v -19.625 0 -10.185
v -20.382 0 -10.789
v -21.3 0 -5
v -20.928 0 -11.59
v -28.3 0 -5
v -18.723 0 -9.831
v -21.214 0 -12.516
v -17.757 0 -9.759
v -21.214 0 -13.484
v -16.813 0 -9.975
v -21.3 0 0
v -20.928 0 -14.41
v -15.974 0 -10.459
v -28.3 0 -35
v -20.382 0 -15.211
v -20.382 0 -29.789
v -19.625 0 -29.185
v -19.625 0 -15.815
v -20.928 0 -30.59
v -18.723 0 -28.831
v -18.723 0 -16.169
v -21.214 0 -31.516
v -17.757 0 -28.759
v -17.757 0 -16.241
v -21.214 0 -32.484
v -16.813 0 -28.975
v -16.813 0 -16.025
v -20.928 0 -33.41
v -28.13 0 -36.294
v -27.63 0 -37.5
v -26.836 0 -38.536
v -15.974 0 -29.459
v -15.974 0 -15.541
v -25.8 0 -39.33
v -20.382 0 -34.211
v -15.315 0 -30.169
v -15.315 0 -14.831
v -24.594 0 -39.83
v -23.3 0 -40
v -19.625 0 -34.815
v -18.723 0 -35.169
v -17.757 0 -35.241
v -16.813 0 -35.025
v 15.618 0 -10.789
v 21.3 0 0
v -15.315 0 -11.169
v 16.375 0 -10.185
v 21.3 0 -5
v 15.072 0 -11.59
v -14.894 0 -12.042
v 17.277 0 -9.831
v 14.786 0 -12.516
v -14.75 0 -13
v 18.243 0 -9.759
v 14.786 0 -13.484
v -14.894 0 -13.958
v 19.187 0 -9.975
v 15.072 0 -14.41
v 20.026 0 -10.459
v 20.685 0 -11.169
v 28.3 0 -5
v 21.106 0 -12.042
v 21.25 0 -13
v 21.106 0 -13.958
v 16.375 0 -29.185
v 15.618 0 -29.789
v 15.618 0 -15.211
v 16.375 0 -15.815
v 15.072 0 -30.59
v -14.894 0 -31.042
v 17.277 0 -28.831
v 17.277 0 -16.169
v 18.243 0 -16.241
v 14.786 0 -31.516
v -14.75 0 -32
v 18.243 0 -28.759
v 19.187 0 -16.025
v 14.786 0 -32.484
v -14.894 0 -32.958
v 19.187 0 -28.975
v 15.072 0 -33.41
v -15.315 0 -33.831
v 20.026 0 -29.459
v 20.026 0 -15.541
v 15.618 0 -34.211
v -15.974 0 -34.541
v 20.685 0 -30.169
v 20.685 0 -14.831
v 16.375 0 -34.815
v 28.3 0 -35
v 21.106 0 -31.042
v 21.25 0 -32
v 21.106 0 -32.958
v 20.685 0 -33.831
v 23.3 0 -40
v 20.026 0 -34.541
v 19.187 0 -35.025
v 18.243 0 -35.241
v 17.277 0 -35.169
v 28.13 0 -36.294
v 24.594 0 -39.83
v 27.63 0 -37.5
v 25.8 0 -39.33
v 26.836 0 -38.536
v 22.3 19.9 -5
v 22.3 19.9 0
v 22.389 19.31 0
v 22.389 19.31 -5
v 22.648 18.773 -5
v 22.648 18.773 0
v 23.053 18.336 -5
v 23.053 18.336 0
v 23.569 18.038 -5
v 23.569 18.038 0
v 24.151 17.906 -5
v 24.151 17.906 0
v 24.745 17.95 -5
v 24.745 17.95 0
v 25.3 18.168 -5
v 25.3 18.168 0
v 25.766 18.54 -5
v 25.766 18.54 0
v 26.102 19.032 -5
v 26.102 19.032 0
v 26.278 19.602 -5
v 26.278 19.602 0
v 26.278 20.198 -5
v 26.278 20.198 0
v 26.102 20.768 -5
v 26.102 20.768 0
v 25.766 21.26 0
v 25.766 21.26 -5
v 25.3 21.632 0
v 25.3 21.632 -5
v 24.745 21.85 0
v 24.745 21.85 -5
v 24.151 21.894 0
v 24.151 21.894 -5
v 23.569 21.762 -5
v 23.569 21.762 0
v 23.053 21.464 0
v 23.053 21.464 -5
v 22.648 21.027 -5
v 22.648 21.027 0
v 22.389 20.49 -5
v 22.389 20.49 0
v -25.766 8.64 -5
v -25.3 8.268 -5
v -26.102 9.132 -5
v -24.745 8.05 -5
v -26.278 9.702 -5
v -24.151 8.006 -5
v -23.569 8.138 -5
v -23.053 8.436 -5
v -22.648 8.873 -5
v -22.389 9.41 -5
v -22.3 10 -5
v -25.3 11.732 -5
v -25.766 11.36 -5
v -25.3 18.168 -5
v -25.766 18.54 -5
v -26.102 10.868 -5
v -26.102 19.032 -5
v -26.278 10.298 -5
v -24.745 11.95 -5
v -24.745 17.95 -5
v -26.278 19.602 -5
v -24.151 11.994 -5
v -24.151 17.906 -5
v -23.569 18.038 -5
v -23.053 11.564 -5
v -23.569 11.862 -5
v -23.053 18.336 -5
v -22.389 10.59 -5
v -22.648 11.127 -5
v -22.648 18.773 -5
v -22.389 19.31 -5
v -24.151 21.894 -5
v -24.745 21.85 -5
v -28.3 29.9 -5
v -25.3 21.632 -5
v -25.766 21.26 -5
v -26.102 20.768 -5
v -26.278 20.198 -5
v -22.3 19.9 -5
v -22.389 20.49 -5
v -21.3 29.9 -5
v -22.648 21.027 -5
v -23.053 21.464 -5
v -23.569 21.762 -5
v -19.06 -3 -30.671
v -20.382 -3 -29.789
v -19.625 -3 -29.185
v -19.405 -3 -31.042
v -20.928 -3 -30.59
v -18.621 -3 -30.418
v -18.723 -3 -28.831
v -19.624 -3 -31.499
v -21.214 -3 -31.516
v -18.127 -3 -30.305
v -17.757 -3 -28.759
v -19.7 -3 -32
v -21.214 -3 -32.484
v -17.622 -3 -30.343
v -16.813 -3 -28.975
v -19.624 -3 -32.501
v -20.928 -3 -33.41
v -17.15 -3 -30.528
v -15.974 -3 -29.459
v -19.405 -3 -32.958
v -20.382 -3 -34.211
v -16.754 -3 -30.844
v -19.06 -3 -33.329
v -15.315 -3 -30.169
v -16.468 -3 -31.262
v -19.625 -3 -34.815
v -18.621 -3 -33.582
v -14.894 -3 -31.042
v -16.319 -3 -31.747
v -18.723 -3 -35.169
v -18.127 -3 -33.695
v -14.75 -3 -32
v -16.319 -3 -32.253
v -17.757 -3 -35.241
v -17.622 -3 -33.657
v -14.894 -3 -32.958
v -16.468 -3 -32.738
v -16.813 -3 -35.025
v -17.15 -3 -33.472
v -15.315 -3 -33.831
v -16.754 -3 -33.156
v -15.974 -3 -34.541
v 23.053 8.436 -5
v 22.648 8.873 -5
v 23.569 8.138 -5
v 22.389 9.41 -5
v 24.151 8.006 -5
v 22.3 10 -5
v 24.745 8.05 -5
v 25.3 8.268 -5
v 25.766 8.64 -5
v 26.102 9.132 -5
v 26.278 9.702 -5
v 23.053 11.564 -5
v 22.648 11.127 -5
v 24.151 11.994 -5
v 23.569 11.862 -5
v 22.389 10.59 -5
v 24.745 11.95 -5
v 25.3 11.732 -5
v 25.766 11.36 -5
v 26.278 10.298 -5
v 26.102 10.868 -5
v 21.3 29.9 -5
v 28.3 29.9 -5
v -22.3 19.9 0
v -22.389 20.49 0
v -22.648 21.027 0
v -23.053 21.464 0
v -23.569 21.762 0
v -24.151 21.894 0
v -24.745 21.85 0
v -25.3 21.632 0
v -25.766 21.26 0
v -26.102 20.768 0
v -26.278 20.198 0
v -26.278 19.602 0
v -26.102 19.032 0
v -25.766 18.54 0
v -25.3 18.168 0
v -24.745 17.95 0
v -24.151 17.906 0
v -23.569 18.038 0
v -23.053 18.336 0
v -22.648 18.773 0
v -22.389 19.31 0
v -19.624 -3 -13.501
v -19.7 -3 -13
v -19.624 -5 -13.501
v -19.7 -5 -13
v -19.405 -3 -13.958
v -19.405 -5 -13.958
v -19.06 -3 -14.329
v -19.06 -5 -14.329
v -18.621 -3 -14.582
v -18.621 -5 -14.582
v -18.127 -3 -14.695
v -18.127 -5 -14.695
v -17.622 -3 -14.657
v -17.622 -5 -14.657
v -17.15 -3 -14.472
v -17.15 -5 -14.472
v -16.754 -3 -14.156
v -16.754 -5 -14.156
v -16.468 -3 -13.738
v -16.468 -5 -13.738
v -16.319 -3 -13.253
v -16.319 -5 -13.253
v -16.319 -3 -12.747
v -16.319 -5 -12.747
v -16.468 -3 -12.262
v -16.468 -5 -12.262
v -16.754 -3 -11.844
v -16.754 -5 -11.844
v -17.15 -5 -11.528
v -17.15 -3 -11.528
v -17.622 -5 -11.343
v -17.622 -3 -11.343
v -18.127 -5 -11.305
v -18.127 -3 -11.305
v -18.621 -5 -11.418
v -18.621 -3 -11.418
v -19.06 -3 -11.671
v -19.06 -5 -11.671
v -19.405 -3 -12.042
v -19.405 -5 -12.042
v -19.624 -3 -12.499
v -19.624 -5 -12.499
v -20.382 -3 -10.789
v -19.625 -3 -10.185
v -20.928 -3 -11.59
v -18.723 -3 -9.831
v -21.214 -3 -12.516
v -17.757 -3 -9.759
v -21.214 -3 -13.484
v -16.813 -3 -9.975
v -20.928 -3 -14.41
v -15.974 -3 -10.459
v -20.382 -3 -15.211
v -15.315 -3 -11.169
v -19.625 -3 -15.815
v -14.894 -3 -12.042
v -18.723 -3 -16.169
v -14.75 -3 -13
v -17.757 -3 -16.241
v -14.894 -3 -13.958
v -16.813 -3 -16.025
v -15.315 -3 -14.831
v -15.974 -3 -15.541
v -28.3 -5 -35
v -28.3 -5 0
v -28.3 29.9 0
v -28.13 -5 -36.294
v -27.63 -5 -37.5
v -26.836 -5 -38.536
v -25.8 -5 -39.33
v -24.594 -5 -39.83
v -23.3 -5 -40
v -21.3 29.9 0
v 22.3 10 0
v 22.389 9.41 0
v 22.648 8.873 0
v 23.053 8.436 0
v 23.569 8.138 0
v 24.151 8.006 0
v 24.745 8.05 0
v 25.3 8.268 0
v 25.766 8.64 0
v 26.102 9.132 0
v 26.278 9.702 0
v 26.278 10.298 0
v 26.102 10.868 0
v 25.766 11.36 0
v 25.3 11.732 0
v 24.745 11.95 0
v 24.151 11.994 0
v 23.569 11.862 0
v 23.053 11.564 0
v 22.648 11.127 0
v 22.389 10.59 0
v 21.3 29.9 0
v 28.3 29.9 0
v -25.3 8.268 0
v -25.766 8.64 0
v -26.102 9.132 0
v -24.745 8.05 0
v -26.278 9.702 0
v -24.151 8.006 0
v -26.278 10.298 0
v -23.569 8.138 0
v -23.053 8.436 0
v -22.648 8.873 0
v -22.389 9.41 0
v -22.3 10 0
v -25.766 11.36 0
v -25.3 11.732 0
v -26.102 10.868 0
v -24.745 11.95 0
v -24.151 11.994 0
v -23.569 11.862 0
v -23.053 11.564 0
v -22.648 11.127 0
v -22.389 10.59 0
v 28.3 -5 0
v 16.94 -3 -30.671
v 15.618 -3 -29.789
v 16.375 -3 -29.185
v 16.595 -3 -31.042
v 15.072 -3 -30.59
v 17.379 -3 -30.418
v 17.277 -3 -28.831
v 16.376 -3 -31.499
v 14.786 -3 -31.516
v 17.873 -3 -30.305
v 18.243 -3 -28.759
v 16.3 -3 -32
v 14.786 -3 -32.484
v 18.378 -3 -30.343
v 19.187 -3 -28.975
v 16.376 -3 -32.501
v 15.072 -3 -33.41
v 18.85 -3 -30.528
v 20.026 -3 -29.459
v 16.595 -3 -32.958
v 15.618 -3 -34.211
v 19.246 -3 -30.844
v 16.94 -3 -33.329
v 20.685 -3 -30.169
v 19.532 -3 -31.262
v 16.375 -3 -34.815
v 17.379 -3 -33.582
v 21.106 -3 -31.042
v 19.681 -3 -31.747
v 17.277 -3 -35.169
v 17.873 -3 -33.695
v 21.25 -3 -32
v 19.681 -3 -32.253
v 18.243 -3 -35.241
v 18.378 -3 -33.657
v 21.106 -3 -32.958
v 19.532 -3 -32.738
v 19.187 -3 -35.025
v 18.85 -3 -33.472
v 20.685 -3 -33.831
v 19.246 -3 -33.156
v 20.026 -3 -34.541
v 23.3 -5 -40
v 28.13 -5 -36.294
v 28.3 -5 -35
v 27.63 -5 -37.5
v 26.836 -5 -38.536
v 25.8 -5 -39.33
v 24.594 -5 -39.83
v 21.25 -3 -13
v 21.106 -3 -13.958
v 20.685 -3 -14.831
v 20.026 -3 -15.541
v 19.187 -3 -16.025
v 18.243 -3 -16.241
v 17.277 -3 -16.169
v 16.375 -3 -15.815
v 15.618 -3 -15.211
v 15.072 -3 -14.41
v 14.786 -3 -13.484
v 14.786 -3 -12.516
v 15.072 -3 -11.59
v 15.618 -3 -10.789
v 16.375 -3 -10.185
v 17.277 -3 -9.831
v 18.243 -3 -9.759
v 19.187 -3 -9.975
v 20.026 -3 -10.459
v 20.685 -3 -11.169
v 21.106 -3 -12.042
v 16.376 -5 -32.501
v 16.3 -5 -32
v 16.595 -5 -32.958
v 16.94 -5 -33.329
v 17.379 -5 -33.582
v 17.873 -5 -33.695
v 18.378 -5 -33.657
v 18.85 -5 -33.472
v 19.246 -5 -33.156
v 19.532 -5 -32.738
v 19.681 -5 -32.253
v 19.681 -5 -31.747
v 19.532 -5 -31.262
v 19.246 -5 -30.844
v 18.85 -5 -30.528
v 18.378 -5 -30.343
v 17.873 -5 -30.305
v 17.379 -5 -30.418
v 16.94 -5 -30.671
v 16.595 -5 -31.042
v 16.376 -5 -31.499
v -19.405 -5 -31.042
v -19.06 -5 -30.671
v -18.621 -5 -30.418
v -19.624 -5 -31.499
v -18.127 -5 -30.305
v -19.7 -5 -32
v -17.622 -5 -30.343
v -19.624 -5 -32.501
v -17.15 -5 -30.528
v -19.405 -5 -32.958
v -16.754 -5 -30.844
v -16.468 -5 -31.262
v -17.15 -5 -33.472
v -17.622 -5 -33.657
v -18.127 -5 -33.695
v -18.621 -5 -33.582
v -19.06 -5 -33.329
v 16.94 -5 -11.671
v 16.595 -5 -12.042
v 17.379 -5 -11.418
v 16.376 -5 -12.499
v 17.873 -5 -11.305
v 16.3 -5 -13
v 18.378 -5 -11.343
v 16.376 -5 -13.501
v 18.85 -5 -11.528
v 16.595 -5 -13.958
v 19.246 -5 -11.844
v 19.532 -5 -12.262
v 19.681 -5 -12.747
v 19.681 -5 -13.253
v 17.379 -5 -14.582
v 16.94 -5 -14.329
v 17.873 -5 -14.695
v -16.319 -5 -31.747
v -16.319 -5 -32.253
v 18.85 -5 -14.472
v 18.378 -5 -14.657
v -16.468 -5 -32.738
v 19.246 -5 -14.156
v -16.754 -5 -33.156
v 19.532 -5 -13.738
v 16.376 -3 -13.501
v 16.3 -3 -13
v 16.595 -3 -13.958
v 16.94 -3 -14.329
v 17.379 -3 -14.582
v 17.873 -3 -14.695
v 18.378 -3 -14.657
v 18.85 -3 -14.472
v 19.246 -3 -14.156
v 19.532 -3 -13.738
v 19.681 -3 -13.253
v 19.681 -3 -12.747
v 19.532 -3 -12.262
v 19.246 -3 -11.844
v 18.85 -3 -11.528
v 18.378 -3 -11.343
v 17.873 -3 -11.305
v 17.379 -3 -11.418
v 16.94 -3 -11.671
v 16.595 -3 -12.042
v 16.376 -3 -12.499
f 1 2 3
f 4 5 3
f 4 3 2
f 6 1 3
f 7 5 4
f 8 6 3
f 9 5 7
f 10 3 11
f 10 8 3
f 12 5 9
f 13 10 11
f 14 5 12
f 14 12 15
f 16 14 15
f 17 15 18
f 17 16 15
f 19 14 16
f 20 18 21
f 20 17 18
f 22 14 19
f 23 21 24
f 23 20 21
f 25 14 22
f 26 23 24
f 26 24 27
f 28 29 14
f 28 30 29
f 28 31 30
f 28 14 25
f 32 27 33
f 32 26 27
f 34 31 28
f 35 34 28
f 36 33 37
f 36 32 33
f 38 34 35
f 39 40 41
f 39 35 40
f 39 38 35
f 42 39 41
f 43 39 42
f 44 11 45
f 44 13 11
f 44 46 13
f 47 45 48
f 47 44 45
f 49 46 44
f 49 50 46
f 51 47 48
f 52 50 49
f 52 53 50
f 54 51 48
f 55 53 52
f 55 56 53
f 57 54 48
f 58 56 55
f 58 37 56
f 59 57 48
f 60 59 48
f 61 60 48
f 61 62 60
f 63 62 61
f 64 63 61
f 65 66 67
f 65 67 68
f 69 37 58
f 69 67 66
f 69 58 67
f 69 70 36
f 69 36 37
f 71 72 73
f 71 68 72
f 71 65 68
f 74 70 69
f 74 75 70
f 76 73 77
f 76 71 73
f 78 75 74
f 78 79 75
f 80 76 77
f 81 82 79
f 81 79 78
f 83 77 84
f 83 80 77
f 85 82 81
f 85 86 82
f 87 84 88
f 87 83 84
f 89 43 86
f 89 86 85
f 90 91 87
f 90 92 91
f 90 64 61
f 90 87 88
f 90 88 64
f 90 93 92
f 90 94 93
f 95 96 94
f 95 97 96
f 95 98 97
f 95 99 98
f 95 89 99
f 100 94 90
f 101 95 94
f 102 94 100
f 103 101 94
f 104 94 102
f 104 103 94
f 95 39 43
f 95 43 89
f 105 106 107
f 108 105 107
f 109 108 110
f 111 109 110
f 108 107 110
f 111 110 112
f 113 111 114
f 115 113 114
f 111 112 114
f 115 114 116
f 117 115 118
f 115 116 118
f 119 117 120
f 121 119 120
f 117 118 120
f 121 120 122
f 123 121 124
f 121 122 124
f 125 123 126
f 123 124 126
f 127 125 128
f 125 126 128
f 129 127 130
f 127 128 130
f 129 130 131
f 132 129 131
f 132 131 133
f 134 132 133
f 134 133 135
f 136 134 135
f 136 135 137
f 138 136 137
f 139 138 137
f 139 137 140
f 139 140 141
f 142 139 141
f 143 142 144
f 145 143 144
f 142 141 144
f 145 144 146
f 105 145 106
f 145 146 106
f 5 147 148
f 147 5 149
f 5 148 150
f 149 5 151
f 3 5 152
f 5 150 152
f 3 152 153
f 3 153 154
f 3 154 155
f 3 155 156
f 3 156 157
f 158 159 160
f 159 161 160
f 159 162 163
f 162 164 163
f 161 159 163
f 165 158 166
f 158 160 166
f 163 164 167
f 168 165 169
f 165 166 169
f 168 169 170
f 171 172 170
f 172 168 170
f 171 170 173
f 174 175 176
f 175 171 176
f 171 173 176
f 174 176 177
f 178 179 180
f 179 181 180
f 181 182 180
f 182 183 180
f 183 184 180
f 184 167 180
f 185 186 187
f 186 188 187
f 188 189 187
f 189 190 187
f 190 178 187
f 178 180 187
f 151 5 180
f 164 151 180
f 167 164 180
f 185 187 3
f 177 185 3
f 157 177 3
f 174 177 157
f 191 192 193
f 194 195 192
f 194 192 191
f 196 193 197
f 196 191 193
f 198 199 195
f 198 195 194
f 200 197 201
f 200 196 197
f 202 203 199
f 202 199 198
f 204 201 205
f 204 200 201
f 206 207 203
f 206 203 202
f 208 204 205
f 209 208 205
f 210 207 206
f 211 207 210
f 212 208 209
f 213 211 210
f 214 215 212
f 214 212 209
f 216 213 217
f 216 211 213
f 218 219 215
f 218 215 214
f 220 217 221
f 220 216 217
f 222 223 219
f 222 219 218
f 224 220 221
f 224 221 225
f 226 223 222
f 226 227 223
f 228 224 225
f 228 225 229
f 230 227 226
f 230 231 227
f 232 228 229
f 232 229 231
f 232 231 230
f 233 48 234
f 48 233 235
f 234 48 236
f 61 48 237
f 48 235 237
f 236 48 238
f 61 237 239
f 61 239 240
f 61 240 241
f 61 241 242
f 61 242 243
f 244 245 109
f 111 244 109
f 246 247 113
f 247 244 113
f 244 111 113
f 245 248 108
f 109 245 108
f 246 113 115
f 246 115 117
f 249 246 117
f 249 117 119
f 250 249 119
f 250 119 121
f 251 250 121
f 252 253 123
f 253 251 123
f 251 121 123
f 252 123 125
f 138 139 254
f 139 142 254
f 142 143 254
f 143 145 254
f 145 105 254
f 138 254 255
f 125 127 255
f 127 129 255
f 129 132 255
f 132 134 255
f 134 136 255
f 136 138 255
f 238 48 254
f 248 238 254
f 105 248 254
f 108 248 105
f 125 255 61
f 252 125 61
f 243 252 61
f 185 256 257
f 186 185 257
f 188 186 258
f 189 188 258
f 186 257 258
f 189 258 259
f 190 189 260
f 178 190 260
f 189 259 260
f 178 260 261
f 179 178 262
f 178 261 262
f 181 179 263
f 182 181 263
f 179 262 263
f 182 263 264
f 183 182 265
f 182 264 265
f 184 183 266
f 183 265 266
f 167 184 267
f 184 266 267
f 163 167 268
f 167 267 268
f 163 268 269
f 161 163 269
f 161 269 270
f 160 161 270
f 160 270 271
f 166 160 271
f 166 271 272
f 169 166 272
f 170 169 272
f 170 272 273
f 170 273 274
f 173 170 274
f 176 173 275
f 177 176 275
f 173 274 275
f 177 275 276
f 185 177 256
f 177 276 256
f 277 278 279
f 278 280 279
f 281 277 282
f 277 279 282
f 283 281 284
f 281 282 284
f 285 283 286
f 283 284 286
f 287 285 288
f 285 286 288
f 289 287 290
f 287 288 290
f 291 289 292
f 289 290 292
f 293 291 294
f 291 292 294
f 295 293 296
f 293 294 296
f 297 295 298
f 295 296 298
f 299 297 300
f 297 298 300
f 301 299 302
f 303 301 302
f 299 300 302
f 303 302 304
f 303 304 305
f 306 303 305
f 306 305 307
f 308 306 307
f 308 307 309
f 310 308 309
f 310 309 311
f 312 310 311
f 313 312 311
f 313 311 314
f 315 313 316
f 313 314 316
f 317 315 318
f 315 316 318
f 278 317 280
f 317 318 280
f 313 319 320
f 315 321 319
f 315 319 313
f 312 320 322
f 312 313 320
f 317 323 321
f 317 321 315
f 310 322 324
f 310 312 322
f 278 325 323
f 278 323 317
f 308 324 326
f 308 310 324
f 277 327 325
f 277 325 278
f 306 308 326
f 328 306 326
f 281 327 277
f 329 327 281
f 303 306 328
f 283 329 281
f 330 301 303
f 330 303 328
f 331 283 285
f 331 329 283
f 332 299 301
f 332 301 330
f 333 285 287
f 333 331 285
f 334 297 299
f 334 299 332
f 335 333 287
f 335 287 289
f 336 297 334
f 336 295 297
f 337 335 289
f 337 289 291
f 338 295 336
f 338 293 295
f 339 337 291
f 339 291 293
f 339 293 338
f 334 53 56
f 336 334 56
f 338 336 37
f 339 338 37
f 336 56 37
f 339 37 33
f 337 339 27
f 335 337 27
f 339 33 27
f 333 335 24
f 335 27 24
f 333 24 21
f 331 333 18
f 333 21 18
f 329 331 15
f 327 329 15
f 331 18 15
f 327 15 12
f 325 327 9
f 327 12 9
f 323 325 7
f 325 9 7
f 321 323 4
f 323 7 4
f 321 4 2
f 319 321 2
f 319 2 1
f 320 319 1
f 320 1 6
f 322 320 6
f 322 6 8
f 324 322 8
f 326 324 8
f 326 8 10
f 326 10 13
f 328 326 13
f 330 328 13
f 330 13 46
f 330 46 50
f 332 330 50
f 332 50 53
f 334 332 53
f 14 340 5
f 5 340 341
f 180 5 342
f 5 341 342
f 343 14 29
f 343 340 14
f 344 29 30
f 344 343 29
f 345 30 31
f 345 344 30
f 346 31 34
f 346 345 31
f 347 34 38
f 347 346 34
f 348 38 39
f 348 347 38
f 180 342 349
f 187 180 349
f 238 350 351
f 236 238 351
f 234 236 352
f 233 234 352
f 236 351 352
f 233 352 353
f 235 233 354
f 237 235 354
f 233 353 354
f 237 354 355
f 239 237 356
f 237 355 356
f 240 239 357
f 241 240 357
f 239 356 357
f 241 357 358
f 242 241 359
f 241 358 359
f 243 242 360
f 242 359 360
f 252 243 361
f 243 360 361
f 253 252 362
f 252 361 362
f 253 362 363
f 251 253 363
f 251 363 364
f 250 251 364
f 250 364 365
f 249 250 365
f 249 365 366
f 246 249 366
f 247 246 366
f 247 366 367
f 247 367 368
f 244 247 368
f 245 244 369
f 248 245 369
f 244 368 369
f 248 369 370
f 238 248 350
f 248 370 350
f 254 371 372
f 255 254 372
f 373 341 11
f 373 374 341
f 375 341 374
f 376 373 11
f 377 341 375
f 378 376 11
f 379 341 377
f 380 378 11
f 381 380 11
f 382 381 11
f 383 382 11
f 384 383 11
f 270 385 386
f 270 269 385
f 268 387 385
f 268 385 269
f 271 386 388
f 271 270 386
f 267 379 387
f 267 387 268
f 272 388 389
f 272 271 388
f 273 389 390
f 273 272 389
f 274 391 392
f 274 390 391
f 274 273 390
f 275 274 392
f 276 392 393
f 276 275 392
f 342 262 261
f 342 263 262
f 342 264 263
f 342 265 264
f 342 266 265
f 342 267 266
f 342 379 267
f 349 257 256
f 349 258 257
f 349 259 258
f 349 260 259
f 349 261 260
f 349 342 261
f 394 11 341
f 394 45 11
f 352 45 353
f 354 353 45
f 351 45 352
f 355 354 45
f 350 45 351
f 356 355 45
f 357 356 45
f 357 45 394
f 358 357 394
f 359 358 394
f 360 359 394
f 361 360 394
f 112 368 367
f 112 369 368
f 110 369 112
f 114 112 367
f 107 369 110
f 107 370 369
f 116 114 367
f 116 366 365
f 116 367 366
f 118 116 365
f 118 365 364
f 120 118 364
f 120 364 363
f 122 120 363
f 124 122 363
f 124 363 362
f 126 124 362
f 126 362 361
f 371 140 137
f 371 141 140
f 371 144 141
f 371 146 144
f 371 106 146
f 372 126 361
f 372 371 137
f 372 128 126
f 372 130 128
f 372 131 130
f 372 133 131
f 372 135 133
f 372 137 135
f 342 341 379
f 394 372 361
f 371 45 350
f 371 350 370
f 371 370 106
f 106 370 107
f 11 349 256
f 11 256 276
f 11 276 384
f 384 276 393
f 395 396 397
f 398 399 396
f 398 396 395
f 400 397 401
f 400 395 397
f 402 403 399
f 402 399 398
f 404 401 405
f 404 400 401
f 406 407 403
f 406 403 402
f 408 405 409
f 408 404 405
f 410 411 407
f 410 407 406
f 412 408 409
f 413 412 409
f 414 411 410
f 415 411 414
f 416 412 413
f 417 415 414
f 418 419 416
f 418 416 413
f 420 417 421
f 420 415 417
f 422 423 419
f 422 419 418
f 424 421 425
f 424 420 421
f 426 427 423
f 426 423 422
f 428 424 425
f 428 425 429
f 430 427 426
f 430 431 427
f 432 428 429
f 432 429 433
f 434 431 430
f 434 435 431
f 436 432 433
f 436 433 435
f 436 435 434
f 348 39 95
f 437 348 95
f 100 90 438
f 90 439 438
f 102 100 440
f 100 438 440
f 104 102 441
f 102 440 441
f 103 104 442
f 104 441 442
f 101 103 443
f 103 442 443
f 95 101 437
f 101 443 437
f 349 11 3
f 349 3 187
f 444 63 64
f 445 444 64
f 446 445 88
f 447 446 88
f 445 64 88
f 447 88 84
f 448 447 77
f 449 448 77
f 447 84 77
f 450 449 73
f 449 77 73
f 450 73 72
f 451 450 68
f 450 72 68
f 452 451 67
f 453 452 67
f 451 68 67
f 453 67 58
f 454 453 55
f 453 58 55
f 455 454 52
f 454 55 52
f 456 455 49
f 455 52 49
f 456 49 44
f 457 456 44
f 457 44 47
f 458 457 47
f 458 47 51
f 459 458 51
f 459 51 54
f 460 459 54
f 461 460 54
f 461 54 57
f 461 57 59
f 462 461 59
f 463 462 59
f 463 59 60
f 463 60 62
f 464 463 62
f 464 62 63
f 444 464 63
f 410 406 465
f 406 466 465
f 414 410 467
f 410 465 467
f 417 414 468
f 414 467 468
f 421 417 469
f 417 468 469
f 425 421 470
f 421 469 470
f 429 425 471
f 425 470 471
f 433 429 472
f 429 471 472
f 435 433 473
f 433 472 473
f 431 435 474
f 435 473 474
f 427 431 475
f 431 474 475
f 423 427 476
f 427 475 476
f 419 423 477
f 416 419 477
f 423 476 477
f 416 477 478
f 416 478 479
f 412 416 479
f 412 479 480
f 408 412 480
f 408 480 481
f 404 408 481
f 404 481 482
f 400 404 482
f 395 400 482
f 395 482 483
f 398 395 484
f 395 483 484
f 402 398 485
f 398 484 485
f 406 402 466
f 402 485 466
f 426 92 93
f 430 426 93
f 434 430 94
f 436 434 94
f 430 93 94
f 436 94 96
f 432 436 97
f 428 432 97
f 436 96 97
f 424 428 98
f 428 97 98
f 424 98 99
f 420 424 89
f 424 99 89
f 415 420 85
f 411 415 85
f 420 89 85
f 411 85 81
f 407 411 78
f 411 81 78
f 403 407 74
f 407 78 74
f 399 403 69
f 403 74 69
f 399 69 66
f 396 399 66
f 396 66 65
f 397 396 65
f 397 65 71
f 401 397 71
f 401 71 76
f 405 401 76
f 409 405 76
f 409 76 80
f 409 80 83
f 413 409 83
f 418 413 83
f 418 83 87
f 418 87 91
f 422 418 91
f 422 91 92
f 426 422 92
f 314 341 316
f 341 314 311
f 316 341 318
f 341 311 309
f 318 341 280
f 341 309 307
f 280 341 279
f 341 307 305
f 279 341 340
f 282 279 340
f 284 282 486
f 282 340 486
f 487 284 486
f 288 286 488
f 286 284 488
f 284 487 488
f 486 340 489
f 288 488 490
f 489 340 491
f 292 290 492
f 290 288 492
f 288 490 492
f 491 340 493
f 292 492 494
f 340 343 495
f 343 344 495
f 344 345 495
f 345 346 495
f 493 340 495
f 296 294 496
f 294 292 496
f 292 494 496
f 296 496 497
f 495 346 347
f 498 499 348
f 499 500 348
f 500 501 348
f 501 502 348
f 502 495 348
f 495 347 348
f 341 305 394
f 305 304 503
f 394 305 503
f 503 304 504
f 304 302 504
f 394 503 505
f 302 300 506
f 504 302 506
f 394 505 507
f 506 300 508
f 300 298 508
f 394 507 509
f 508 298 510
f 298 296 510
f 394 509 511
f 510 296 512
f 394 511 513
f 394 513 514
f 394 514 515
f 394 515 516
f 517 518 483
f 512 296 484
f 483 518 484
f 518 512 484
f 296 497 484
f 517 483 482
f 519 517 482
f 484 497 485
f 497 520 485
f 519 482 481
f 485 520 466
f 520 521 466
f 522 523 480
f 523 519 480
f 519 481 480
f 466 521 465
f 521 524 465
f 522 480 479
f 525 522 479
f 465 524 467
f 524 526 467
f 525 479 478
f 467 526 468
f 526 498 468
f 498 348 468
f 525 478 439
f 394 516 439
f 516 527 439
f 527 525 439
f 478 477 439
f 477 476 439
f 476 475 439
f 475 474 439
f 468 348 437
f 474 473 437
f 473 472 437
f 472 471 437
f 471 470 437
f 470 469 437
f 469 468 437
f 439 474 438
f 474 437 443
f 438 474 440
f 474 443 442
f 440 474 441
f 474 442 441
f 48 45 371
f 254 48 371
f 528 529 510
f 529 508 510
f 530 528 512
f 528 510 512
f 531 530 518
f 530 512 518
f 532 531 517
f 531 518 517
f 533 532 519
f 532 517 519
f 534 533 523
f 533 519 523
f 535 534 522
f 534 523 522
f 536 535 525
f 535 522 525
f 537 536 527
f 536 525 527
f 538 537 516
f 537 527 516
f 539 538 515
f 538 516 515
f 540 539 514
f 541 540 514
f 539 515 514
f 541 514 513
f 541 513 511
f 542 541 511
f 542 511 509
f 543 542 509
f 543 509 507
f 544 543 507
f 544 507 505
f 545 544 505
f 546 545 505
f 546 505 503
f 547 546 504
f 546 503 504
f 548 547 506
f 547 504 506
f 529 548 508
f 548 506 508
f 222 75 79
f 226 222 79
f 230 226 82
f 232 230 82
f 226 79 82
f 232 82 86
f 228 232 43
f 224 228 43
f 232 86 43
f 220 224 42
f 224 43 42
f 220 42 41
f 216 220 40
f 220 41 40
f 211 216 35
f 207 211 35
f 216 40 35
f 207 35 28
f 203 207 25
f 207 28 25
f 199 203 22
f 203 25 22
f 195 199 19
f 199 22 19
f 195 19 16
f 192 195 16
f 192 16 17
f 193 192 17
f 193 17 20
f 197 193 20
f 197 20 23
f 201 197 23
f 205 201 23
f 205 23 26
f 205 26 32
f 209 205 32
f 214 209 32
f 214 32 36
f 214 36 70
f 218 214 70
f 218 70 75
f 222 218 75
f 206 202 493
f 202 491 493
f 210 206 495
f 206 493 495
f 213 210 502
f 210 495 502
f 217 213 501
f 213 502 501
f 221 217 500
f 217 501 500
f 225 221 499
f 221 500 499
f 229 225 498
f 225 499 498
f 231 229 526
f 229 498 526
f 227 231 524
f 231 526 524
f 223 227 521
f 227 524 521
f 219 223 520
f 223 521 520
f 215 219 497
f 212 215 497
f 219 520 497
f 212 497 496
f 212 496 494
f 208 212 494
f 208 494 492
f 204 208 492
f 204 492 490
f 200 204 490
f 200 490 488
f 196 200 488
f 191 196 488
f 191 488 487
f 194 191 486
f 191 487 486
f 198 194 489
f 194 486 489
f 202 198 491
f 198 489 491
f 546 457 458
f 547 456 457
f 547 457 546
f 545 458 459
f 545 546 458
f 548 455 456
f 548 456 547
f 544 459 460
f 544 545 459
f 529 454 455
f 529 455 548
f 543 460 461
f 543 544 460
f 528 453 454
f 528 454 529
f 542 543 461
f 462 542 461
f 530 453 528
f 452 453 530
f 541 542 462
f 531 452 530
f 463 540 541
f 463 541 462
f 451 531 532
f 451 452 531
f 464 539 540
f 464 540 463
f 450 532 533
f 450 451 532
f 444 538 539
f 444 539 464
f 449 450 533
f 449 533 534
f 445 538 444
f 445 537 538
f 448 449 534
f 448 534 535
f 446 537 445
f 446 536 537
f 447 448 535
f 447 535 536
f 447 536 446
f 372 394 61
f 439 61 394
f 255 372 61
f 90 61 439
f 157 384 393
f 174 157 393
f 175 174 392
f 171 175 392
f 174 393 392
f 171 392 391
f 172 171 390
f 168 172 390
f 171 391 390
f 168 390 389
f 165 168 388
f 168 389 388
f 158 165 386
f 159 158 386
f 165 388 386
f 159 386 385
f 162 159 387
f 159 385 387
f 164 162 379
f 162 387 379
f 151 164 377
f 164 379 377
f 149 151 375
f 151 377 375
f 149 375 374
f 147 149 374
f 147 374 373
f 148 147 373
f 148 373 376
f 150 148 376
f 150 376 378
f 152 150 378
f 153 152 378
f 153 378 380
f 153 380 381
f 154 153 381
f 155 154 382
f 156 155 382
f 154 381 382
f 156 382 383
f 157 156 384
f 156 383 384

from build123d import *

# Parameters (mm, degrees)
SKETCH3_W                      = 56.6
SKETCH3_H                      = 40
BOSS_EXTRUDE1_DEPTH            = 5
SKETCH2_W                      = 7
SKETCH2_H                      = 29.9
SKETCH2_R                      = 2
BOSS_EXTRUDE2_DEPTH            = 5
CBORE_FOR_M3_SHCS2_D           = 3.4
CBORE_FOR_M3_SHCS2_DEPTH       = 5
CBORE_FOR_M3_SHCS2_CBORE_D     = 6.5
CBORE_FOR_M3_SHCS2_CBORE_DEPTH = 3
CBORE_FOR_M3_SHCS2_TIP         = 1.021463052
FILLET1_R                      = 5


with BuildPart() as part:
    # Sketch3 → Boss-Extrude1 (new body)
    with BuildSketch(Plane(origin=(0, 0, 0), x_dir=(1, 0, 0), z_dir=(0, 1, 0))):
        with Locations((0, 20)):
            Rectangle(SKETCH3_W, SKETCH3_H)
    extrude(amount=-BOSS_EXTRUDE1_DEPTH)

    # Sketch2 → Boss-Extrude2 (add)
    # profile 1 of 2: a face of its own
    with BuildSketch(Plane.XY):
        with Locations((-24.8, 14.95)):
            Rectangle(SKETCH2_W, SKETCH2_H)
        with Locations((-24.3, 19.9)):
            Circle(SKETCH2_R, mode=Mode.SUBTRACT)
        with Locations((-24.3, 10)):
            Circle(SKETCH2_R, mode=Mode.SUBTRACT)
    # profile 2 of 2: a face of its own
    with BuildSketch(Plane.XY):
        with Locations((24.8, 14.95)):
            Rectangle(SKETCH2_W, SKETCH2_H)
        with Locations(Location((24.3, 10, 0), (0, 0, 180))):
            Circle(SKETCH2_R, mode=Mode.SUBTRACT)
        with Locations(Location((24.3, 19.9, 0), (0, 0, 180))):
            Circle(SKETCH2_R, mode=Mode.SUBTRACT)
    extrude(amount=-BOSS_EXTRUDE2_DEPTH)

    # CBORE for M3 SHCS2
    with Locations(Plane(origin=(0, 0, 0), x_dir=(1, 0, 0), z_dir=(0, 1, 0))):
        with Locations((-18, 32), (18, 13), (-18, 13), (18, 32)):
            CounterBoreHole(CBORE_FOR_M3_SHCS2_D / 2, CBORE_FOR_M3_SHCS2_CBORE_D / 2, CBORE_FOR_M3_SHCS2_CBORE_DEPTH, depth=CBORE_FOR_M3_SHCS2_DEPTH)
            with Locations((0, 0, -(CBORE_FOR_M3_SHCS2_DEPTH + CBORE_FOR_M3_SHCS2_TIP / 2))):  # 118° drill point
                Cone(0, CBORE_FOR_M3_SHCS2_D / 2, CBORE_FOR_M3_SHCS2_TIP, mode=Mode.SUBTRACT)

    # Fillet1
    fillet1_edges = [part.edges().sort_by_distance(p)[0] for p in [
        (-28.3, -2.5, -40),
        (28.3, -2.5, -40),
    ]]
    fillet(fillet1_edges, radius=FILLET1_R)


solid = part.part
